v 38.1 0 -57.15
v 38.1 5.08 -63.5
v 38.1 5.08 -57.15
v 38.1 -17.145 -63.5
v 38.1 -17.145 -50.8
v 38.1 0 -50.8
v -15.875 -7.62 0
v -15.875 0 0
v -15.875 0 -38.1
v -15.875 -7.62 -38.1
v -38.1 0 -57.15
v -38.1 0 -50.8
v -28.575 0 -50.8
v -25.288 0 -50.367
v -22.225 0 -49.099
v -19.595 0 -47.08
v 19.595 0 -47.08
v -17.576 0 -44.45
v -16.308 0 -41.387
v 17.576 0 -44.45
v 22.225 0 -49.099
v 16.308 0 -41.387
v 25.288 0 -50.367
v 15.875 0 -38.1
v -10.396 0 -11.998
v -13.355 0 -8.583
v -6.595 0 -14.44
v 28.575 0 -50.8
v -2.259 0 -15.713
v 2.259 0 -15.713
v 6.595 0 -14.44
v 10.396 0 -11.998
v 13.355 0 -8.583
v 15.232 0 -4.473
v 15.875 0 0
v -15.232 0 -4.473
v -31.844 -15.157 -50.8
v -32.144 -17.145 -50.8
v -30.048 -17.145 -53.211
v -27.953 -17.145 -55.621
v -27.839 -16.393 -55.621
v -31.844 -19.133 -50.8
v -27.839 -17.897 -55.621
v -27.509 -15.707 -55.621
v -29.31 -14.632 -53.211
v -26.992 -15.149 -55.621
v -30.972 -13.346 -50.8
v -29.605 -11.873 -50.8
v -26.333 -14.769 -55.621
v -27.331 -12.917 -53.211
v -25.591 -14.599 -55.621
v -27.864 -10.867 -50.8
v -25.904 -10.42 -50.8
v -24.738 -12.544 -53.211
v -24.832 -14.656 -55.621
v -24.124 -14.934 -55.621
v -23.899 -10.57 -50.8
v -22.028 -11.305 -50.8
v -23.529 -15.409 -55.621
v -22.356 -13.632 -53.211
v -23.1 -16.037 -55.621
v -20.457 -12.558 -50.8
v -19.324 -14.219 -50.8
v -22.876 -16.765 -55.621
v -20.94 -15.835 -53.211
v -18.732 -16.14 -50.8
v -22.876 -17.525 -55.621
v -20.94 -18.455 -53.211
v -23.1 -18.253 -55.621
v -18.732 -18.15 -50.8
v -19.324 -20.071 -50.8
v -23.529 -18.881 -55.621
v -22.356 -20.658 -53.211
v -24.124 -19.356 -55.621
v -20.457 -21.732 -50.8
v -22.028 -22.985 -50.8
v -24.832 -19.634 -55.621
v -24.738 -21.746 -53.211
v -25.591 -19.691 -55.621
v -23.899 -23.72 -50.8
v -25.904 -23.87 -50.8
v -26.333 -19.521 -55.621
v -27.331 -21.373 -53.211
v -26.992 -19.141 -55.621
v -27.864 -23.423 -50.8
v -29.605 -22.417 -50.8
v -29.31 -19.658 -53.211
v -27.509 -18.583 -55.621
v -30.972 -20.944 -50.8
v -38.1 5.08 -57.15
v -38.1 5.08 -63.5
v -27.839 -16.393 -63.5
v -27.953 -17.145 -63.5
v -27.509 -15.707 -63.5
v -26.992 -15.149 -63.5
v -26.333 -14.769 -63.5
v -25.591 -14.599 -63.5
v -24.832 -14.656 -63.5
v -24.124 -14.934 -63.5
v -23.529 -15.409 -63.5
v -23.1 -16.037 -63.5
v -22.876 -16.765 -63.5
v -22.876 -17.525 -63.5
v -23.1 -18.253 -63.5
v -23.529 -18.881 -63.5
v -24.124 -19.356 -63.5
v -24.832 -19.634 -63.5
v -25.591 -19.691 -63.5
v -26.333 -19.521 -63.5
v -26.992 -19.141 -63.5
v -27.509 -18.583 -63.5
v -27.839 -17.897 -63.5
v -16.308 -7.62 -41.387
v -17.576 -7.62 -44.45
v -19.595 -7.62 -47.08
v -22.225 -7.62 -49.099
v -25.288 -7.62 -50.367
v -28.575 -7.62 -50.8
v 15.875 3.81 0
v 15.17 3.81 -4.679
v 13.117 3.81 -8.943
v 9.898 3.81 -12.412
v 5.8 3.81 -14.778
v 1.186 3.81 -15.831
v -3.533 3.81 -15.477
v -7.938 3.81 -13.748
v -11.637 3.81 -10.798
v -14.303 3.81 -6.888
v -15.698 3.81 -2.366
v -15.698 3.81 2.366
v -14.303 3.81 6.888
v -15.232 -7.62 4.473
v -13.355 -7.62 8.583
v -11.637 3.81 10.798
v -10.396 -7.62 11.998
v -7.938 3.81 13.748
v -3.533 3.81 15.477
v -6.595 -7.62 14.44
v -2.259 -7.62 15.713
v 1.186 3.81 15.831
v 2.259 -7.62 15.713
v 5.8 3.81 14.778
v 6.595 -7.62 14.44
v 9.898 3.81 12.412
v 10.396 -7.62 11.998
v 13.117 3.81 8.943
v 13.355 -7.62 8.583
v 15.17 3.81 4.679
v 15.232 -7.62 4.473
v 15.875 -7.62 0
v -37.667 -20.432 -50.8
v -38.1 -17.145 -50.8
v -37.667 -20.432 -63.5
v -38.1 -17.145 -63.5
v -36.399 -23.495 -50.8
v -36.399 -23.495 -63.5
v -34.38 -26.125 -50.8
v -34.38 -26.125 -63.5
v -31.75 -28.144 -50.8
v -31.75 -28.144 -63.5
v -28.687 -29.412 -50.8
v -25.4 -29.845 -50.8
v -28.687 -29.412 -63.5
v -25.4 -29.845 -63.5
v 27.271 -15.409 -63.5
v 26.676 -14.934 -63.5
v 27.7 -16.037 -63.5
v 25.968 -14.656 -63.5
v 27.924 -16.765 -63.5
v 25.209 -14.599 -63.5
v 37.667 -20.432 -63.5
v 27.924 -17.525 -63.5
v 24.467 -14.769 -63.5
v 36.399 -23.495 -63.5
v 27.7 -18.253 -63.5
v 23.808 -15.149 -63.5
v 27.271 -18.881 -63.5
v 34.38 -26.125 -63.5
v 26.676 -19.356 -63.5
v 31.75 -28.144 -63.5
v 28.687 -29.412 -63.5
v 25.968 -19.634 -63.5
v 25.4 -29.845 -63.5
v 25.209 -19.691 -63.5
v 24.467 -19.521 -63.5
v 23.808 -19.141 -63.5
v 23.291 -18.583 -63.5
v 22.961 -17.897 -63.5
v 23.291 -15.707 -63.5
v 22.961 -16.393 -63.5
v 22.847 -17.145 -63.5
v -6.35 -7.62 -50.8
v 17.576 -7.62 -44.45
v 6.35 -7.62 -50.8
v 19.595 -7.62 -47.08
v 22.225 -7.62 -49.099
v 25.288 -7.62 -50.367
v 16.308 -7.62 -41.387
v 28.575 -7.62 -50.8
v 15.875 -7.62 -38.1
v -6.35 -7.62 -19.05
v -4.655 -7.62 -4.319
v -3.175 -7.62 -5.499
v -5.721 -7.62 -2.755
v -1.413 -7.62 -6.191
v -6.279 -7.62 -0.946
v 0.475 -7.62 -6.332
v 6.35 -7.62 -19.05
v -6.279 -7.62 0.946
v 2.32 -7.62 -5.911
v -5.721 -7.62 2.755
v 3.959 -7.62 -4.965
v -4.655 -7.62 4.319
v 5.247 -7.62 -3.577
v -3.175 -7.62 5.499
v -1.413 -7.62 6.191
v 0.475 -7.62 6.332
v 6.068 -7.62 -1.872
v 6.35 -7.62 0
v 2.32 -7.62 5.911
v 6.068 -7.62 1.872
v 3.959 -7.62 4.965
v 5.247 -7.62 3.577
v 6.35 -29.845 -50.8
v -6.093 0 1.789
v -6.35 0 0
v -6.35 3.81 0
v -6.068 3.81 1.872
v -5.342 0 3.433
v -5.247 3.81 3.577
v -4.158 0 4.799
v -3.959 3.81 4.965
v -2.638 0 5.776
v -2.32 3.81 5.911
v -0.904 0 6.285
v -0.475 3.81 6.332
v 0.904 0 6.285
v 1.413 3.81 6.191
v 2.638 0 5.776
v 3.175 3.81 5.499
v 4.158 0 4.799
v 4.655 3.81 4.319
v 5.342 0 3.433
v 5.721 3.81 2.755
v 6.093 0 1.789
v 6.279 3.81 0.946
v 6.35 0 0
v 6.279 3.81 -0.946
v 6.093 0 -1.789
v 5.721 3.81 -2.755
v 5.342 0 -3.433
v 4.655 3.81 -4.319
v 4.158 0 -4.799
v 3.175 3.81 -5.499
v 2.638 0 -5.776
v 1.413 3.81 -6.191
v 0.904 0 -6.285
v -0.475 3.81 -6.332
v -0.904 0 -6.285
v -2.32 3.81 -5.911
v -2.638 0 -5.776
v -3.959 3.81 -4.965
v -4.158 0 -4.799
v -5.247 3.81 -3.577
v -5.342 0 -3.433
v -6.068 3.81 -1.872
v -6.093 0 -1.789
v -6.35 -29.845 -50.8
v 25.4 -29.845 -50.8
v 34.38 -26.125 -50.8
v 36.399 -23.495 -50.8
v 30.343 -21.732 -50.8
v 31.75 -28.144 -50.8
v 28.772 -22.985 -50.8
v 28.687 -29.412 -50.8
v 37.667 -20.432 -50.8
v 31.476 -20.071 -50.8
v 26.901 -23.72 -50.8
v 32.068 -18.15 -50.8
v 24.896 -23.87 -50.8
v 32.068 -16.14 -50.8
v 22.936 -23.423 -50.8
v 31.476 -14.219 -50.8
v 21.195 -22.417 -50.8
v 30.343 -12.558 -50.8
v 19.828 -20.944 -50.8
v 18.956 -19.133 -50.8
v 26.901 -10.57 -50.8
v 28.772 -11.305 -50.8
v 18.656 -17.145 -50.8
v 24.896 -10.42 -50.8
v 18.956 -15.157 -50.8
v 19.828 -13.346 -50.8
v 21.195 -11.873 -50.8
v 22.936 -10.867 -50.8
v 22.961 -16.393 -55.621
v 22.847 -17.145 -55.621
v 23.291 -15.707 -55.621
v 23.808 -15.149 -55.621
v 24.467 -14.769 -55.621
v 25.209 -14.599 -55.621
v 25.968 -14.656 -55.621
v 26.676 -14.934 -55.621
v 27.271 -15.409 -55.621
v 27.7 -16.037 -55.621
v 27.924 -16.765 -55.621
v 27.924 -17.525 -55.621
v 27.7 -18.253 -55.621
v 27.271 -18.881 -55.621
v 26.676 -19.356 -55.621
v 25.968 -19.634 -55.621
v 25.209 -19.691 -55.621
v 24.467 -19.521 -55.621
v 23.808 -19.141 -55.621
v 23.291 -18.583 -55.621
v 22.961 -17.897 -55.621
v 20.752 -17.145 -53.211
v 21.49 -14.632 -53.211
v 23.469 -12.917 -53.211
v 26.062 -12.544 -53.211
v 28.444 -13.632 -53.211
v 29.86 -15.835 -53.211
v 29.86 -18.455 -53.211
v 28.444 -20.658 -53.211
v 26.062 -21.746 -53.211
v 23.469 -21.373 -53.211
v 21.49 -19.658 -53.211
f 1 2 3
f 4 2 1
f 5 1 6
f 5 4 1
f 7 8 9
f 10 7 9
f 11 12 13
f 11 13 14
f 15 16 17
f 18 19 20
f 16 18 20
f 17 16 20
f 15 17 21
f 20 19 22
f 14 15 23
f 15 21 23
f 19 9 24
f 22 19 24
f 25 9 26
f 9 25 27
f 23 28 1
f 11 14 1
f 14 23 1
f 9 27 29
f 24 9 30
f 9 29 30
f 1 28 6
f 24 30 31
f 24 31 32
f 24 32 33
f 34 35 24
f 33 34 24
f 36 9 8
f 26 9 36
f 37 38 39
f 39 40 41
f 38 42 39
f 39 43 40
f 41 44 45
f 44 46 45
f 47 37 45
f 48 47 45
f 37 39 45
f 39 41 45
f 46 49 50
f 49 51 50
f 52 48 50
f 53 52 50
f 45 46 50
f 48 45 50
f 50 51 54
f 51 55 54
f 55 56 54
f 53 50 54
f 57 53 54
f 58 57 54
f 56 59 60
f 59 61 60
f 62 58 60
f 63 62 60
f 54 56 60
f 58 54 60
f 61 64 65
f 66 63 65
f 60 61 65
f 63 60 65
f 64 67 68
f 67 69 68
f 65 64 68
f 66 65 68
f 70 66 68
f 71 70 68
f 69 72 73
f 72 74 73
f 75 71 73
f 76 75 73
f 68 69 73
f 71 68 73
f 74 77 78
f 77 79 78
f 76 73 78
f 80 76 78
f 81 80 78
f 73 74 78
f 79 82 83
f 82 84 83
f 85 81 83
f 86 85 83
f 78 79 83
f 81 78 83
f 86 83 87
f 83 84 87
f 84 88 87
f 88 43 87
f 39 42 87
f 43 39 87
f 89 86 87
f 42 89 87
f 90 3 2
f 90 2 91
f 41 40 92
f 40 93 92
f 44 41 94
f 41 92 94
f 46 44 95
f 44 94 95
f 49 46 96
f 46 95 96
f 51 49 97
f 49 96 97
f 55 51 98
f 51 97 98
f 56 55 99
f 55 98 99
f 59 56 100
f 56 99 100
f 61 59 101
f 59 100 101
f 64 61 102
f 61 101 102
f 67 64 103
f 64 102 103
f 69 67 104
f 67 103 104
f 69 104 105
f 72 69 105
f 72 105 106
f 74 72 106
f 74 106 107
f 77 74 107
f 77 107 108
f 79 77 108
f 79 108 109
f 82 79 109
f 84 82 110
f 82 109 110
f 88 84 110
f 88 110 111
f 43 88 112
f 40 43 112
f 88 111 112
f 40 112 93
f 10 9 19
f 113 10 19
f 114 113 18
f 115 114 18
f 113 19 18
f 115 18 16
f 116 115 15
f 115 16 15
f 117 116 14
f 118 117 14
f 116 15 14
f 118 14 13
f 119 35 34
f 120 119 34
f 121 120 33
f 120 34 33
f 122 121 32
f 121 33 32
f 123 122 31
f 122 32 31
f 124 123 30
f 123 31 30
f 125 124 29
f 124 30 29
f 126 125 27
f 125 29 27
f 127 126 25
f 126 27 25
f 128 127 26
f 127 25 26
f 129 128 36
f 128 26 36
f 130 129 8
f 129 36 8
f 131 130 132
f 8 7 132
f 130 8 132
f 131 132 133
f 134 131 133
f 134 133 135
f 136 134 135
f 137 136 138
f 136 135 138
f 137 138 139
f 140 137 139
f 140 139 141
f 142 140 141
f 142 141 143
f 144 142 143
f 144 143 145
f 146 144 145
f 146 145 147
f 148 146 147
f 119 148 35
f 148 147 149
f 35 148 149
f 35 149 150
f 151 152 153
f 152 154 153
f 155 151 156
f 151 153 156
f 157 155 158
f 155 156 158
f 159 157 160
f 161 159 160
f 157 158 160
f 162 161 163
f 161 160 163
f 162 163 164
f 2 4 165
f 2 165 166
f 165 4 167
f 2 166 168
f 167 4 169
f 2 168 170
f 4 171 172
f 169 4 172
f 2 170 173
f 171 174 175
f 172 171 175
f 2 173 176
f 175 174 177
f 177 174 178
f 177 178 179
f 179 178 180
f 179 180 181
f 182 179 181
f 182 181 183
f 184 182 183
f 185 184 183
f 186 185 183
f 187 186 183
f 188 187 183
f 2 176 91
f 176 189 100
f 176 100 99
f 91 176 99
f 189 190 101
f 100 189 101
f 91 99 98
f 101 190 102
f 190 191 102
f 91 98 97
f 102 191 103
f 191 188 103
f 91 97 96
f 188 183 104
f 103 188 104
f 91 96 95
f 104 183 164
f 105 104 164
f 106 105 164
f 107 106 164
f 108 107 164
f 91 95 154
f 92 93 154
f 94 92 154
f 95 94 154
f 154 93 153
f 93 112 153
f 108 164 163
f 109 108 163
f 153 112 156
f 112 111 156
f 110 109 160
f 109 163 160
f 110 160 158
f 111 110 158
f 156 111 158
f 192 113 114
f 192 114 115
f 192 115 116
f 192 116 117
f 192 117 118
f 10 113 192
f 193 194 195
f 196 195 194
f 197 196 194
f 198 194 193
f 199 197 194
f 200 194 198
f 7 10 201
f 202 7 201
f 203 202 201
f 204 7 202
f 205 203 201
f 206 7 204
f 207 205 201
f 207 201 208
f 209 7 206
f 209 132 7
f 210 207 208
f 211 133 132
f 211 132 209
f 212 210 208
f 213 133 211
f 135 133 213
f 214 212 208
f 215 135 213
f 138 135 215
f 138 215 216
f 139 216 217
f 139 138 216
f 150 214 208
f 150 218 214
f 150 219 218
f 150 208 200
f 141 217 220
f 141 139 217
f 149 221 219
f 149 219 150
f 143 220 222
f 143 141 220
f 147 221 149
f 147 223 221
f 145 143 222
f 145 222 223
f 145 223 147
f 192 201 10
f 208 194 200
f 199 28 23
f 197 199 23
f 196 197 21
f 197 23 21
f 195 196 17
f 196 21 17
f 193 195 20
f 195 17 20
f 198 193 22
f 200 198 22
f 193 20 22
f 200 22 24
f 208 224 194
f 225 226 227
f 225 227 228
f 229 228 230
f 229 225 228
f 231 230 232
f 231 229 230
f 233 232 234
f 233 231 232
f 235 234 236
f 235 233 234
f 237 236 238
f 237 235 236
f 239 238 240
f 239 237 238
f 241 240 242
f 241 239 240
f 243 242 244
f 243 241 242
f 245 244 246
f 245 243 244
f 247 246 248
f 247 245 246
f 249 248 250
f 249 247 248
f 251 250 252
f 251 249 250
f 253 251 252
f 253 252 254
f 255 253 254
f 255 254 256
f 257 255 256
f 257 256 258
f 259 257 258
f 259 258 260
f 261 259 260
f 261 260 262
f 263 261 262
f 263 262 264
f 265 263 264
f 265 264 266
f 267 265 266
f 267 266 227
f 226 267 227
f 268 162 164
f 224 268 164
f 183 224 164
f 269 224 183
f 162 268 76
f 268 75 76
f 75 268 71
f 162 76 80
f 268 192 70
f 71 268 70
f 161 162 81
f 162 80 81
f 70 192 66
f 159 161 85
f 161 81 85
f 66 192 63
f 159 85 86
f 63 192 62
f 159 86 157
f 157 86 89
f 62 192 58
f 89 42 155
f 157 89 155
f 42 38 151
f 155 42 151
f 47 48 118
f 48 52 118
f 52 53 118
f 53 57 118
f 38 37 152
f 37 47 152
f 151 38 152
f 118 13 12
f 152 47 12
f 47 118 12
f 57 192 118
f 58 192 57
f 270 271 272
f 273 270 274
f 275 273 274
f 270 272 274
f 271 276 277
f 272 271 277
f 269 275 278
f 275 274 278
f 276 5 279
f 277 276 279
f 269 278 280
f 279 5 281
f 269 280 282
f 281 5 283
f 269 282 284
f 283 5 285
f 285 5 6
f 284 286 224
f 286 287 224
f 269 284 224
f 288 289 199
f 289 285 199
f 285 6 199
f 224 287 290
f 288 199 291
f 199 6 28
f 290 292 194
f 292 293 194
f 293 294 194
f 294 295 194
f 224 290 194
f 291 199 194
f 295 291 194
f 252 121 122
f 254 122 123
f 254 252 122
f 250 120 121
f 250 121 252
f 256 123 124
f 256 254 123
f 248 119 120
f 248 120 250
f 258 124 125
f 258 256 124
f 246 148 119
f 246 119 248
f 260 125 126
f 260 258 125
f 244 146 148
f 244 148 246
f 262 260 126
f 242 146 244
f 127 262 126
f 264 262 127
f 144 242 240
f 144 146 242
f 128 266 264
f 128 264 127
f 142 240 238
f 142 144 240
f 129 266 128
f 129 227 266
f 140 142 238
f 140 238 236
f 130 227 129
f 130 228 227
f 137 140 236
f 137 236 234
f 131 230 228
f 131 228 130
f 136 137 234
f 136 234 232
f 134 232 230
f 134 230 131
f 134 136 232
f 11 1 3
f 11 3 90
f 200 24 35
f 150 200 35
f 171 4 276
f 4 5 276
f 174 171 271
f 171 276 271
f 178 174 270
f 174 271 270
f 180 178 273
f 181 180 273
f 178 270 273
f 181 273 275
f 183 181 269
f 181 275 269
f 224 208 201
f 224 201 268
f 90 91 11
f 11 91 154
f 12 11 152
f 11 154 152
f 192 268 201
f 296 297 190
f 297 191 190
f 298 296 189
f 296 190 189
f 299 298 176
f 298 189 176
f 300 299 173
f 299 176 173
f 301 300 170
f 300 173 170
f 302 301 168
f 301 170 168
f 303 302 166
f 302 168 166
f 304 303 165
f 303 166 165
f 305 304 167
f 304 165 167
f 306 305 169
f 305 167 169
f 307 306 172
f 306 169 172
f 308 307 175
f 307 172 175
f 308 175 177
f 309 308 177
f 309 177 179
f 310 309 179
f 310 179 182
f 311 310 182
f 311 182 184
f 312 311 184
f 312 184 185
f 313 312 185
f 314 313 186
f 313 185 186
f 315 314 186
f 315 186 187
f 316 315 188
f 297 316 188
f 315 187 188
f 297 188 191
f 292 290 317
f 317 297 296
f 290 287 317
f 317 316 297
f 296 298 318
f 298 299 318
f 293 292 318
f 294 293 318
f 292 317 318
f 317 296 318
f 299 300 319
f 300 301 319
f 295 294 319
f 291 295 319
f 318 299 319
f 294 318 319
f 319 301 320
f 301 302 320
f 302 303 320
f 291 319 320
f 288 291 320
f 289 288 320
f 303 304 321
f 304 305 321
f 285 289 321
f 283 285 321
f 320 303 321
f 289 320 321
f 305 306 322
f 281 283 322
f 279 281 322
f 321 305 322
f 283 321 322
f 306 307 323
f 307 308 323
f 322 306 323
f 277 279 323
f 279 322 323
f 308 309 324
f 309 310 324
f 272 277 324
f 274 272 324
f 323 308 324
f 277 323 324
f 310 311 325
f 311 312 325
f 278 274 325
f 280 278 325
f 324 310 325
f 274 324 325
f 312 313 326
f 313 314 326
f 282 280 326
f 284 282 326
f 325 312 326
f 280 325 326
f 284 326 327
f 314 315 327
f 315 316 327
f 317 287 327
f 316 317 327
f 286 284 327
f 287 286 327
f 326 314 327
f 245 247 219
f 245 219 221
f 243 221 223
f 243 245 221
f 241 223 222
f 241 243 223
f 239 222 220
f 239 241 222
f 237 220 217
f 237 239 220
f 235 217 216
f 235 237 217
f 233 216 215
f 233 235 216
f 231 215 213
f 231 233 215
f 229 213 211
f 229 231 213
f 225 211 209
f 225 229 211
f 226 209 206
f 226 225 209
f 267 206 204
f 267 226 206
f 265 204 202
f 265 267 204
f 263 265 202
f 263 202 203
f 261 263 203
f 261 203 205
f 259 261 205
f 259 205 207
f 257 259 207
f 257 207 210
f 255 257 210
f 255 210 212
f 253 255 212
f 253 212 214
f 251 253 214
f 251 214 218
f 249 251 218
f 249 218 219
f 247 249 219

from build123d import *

# Parameters (mm, degrees)
F1_DEPTH        = 29.845
F0_R            = 6.35
F2_DEPTH        = 7.62
F3_W            = 76.2
F3_H            = 6.35
F4_DEPTH        = 5.08
F5_R            = 6.35
F6_DEPTH        = 3.81
F8_DEPTH        = 6.35
F9_R            = 12.7
F11_D           = 5.1054
F11_CSINK_D     = 13.4874
F11_CSINK_ANGLE = 82


with BuildPart() as f1:
    # F0 (on Front) → F1 (new body)
    with BuildSketch(Plane.XZ):
        Polygon((38.1, -50.8), (28.575, -50.8), (-28.575, -50.8), (-38.1, -50.8), (-38.1, -63.5), (38.1, -63.5), align=None)
    extrude(amount=F1_DEPTH)

    # F0 (on Front) → F2 (join)
    with BuildSketch(Plane.XZ):
        with BuildLine():
            Line((15.875, -38.1), (15.875, 0))
            ThreePointArc((15.875, 0), (0, 15.875), (-15.875, 0))
            Line((-15.875, 0), (-15.875, -38.1))
            ThreePointArc((-15.875, -38.1), (-19.5947438789, -47.0802561211), (-28.575, -50.8))
            Line((-28.575, -50.8), (28.575, -50.8))
            ThreePointArc((28.575, -50.8), (19.5947438789, -47.0802561211), (15.875, -38.1))
        make_face()
        Circle(F0_R, mode=Mode.SUBTRACT)
    extrude(amount=F2_DEPTH)

    # F3 (on face) → F4 (join)
    with BuildSketch(Plane(origin=(0, 0, 0), x_dir=(-1, 0, 0), z_dir=(0, 1, 0))):
        with Locations((0, -60.325)):
            Rectangle(F3_W, F3_H)
    extrude(amount=F4_DEPTH)

    # F5 (on face) → F6 (join)
    with BuildSketch(Plane(origin=(0, 0, 0), x_dir=(-1, 0, 0), z_dir=(0, 1, 0))):
        with BuildLine():
            ThreePointArc((15.875, 0), (0, 15.875), (-15.875, 0))
            ThreePointArc((-15.875, 0), (0, -15.875), (15.875, 0))
        make_face()
        Circle(F5_R, mode=Mode.SUBTRACT)
    extrude(amount=F6_DEPTH)

    # F7 (on Right) → F8 (join, symmetric)
    with BuildSketch(Plane.YZ):
        Polygon((-7.62, -50.8), (-7.62, -19.05), (-29.845, -50.8), align=None)
    extrude(amount=F8_DEPTH, both=True)

    # F9
    f9_edges = [f1.edges().sort_by_distance(p)[0] for p in [
        (-38.1, -29.845, -57.15),
        (38.1, -29.845, -57.15),
    ]]
    fillet(f9_edges, radius=F9_R)

    # F11 (through all)
    with Locations(Plane.XY.offset(-50.8)):
        with Locations((25.4, -17.145), (-25.4, -17.145)):
            CounterSinkHole(F11_D / 2, F11_CSINK_D / 2, counter_sink_angle=F11_CSINK_ANGLE)


solid = f1.part
